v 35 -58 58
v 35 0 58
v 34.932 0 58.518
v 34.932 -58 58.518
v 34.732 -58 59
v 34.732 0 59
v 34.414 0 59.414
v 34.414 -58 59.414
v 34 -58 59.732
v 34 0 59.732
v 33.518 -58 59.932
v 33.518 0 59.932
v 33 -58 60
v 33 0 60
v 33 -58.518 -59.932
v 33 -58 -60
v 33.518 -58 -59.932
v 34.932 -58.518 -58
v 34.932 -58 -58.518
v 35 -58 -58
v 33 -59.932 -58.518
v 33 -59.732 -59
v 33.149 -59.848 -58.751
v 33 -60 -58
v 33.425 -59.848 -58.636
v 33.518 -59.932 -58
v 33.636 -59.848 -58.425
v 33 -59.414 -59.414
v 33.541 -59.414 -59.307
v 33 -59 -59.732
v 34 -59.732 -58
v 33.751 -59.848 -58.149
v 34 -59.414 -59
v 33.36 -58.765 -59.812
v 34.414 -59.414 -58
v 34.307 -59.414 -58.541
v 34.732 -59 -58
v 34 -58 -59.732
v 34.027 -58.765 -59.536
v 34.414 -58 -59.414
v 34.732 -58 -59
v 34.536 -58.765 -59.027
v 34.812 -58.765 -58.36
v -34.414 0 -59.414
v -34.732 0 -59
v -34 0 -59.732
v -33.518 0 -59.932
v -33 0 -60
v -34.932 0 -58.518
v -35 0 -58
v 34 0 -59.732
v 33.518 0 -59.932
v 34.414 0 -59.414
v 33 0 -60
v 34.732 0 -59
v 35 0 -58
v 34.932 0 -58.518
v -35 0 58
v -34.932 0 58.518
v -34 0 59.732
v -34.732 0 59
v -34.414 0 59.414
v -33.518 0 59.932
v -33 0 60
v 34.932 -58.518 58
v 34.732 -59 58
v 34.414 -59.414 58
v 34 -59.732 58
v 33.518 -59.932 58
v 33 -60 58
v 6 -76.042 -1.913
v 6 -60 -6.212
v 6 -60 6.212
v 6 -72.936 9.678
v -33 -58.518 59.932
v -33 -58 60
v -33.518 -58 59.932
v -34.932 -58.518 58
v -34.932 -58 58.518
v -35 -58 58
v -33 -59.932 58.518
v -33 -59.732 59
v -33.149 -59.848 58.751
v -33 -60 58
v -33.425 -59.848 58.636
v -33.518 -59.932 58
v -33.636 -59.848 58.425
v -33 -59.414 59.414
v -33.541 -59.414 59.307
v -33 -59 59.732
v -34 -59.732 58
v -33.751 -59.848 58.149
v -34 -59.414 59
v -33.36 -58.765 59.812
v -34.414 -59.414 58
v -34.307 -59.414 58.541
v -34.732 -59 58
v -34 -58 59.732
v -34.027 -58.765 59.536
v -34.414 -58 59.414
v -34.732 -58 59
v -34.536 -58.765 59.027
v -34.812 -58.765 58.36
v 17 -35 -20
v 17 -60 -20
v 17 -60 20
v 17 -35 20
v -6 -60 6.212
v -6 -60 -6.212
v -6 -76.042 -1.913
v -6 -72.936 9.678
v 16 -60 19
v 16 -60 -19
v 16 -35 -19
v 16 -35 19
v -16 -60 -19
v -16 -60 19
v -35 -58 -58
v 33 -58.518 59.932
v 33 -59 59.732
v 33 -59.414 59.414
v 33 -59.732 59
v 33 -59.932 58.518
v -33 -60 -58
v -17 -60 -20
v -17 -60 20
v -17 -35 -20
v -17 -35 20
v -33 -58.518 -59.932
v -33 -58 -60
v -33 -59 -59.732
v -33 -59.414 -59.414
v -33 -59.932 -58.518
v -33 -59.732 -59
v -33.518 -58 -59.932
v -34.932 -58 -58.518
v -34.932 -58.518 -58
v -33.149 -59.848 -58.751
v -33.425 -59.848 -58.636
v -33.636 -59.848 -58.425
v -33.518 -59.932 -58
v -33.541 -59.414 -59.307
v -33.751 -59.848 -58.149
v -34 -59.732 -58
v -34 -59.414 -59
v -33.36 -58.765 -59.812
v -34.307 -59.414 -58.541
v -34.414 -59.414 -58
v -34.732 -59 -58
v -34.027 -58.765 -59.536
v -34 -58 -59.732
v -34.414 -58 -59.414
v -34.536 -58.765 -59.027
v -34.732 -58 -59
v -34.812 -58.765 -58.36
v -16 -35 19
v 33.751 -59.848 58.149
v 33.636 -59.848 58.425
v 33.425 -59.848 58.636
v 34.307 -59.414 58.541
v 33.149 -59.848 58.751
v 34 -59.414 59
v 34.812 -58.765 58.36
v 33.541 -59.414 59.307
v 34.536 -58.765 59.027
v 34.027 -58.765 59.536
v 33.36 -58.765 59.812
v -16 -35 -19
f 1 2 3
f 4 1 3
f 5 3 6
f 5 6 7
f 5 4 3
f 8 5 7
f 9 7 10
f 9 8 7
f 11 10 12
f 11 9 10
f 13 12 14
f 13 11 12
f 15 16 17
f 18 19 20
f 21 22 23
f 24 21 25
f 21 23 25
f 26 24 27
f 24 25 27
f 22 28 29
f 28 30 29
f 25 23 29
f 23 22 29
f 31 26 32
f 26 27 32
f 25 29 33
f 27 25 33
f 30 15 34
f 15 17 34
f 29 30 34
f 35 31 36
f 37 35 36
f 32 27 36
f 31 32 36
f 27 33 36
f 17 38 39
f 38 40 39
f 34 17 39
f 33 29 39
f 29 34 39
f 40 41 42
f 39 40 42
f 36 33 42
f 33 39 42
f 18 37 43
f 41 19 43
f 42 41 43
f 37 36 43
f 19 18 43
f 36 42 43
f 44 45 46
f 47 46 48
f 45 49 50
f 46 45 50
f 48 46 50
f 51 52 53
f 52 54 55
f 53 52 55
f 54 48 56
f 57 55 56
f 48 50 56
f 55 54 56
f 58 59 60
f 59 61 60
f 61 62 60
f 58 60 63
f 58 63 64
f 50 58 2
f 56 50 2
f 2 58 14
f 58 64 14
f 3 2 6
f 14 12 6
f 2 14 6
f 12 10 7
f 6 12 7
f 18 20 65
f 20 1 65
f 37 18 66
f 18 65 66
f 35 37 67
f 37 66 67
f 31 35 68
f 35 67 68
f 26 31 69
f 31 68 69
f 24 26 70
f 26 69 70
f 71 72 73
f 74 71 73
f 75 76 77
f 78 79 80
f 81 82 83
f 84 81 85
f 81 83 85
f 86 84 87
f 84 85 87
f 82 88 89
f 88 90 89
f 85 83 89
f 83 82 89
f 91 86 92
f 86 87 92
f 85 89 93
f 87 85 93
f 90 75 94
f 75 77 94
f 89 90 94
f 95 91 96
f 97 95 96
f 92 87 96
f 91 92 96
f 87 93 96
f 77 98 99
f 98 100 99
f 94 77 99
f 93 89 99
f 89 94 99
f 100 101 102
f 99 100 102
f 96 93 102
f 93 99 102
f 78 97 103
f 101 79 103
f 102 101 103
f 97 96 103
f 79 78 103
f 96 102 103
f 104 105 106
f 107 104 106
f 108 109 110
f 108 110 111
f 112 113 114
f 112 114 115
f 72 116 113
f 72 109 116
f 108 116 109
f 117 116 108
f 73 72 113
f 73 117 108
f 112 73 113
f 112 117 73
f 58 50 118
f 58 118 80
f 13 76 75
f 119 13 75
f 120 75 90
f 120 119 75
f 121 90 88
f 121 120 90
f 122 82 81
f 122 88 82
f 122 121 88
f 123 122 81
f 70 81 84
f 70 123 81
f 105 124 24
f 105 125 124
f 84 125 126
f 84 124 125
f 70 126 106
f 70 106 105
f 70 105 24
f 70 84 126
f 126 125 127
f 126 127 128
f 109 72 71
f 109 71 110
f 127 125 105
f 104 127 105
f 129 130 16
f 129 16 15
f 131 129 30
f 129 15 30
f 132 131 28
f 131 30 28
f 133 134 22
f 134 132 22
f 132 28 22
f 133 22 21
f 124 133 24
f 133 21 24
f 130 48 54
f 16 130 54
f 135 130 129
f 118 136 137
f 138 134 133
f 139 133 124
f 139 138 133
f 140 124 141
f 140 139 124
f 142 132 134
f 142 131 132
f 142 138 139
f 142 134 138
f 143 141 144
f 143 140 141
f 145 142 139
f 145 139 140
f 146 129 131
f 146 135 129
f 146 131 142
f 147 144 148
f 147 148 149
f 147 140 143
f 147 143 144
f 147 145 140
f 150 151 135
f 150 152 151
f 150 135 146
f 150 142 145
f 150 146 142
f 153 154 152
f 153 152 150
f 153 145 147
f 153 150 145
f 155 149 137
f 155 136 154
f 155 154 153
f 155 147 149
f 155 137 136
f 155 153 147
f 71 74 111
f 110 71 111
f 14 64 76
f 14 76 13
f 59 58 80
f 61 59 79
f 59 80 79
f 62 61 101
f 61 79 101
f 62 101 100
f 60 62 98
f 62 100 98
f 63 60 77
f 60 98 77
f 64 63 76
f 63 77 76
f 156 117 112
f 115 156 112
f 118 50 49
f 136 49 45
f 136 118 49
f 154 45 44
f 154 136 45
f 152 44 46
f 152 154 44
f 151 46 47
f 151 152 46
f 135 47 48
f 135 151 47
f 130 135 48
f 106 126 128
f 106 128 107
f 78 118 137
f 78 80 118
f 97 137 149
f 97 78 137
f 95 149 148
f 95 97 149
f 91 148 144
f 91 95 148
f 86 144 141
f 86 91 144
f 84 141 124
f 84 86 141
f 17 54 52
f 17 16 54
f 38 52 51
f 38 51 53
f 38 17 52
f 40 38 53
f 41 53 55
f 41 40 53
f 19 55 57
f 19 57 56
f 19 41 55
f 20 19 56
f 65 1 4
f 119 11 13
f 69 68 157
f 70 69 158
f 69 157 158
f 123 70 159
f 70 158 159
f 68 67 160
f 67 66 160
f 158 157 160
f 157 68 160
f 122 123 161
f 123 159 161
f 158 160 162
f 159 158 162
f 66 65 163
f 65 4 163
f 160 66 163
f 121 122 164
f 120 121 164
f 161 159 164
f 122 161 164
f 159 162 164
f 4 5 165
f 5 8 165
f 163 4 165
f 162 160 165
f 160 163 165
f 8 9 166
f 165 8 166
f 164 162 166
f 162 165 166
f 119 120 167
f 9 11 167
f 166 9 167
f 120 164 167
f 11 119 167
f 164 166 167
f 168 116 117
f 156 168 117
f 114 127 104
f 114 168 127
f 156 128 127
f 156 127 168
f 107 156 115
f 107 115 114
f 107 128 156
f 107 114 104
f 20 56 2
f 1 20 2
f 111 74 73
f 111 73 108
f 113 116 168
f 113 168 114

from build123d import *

# Parameters (mm, degrees)
F0_W     = 70
F0_H     = 120
F1_DEPTH = 60
F2_R     = 2
F3_W     = 34
F3_H     = 40
F3_W_2   = 32
F3_H_2   = 38
F4_DEPTH = 25
F7_W     = 12
F7_H     = 12
F8_DEPTH = 15


with BuildPart() as f1:
    # F0 (on Front) → F1 (new body)
    with BuildSketch(Plane.XZ):
        Rectangle(F0_W, F0_H)
    extrude(amount=F1_DEPTH)

    # F2
    f2_edges = [f1.edges().sort_by_distance(p)[0] for p in [
        (35, -30, 60),
        (35, -30, -60),
        (-35, -30, 60),
        (-35, -30, -60),
        (0, -60, -60),
        (35, -60, 0),
        (0, -60, 60),
        (-35, -60, 0),
    ]]
    fillet(f2_edges, radius=F2_R)

    # F3 (on face) → F4 (cut)
    with BuildSketch(Plane.XZ.offset(60)):
        Rectangle(F3_W, F3_H)
        Rectangle(F3_W_2, F3_H_2, mode=Mode.SUBTRACT)
    extrude(amount=-F4_DEPTH, mode=Mode.SUBTRACT)

    # F7 (on face) → F8 (join, symmetric)
    with BuildSketch(Plane(origin=(0, -55.980762, 15), x_dir=(-1, 0, 0), z_dir=(0, 0.965926, -0.258819))):
        with Locations((0, -15.529143)):
            Rectangle(F7_W, F7_H)
    extrude(amount=F8_DEPTH, both=True)


solid = f1.part
